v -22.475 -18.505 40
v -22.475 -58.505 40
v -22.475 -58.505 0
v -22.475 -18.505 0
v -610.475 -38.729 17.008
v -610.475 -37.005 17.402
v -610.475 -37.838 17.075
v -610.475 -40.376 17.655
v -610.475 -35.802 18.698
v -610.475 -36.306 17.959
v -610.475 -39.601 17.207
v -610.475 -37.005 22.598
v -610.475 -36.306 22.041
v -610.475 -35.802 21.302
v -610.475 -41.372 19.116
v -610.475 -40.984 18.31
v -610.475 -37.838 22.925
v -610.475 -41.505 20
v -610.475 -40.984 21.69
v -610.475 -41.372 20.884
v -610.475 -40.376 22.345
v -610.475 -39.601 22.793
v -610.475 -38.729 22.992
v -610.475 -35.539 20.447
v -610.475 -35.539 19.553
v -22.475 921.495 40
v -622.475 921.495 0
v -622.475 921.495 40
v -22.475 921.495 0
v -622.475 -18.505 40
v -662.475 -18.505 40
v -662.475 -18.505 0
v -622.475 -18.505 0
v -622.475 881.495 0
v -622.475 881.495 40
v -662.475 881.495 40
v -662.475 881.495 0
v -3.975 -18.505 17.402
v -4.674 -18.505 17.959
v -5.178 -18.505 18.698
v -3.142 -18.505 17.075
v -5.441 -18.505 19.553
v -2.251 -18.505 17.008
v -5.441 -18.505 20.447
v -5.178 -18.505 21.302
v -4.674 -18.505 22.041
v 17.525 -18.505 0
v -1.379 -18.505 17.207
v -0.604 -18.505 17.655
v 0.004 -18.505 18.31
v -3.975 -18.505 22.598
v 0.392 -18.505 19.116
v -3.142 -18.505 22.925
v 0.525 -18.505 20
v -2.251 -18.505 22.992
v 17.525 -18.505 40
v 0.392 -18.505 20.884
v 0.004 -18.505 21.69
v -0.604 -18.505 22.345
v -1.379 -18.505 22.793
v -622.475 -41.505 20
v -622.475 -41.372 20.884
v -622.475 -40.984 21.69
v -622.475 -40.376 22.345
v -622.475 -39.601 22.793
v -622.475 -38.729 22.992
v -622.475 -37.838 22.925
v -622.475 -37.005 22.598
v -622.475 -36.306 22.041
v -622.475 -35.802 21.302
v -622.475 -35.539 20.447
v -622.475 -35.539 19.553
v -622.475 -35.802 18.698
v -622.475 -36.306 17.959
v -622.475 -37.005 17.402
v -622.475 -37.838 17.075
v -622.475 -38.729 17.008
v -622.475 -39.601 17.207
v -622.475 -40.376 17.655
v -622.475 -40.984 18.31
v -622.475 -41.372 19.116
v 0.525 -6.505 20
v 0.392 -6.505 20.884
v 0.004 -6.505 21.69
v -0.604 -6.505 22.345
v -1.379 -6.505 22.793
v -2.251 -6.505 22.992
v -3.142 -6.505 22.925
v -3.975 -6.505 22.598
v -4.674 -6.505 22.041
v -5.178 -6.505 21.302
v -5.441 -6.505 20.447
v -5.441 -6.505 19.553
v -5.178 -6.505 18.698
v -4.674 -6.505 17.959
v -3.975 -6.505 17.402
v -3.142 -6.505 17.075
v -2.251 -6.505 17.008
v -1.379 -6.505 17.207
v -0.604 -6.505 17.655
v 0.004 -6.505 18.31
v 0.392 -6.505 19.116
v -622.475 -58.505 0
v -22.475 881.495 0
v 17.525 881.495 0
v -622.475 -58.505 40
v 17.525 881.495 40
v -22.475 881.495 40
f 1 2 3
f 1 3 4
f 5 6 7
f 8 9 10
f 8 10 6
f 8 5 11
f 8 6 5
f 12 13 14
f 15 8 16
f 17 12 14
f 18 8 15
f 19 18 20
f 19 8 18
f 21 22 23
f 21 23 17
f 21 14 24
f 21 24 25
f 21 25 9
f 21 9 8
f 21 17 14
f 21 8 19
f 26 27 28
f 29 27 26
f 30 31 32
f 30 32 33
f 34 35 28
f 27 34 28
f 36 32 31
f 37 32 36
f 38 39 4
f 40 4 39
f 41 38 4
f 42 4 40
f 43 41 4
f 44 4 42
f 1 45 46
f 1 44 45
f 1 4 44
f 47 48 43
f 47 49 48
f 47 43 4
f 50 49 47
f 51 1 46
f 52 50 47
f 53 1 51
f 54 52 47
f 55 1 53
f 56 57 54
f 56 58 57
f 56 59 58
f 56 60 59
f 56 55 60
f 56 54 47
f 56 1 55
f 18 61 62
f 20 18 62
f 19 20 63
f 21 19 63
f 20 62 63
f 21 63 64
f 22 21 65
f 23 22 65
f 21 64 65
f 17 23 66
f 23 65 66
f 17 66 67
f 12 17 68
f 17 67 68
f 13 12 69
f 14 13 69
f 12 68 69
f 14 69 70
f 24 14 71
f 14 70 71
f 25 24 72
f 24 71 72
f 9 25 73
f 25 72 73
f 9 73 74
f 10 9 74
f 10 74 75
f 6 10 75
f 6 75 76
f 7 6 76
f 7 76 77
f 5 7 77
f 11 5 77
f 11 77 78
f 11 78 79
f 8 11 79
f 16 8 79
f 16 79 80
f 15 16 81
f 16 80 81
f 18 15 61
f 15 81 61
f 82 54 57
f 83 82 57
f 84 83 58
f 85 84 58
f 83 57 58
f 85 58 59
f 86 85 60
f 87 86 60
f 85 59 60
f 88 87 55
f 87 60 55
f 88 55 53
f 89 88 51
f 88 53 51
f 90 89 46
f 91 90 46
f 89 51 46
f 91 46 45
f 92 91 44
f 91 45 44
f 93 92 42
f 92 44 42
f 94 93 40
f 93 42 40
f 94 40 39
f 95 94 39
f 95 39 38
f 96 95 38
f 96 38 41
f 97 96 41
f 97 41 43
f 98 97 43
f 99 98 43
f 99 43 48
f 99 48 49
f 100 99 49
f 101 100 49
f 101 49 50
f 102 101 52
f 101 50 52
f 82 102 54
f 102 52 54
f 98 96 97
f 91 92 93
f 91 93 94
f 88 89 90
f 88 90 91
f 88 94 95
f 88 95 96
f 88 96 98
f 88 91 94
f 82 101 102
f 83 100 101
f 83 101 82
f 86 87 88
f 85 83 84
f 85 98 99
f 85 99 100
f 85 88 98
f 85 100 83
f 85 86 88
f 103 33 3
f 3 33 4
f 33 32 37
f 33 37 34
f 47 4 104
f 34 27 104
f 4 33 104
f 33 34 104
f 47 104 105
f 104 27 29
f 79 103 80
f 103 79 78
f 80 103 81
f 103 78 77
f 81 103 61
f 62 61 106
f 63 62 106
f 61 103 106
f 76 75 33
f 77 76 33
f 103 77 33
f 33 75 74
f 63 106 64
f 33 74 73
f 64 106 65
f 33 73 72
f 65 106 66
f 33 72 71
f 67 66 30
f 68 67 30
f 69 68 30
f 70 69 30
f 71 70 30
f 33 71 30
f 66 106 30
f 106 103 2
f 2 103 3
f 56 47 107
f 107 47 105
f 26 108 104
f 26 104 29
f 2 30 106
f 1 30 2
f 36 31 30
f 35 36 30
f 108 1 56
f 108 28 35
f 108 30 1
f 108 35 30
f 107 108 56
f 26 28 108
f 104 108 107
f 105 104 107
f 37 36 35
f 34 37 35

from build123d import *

# Parameters (mm, degrees)
F0_W     = 680
F0_H     = 980
F1_DEPTH = 40
F2_W     = 40
F2_H     = 40
F3_DEPTH = 40
F4_R     = 3
F5_DEPTH = 12
F6_R     = 3
F7_DEPTH = 12


with BuildPart() as f1:
    # F0 (on Top) → F1 (new body)
    with BuildSketch(Plane.XY):
        with Locations((-322.474923, 431.49489)):
            Rectangle(F0_W, F0_H)
    extrude(amount=F1_DEPTH)

    # F2 (on face) → F3 (cut)
    with BuildSketch(Plane.XY.offset(40)):
        with Locations((-642.474923, 901.49489)):
            Rectangle(F2_W, F2_H)
        with Locations((-2.474923, 901.49489)):
            Rectangle(F2_W, F2_H)
        with Locations((-642.474923, -38.50511)):
            Rectangle(F2_W, F2_H)
        with Locations((-2.474923, -38.50511)):
            Rectangle(F2_W, F2_H)
    extrude(amount=-F3_DEPTH, mode=Mode.SUBTRACT)

    # F4 (on face) → F5 (cut)
    with BuildSketch(Plane.XZ.offset(18.50511)):
        with Locations((-2.474923, 20)):
            Circle(F4_R)
    extrude(amount=-F5_DEPTH, mode=Mode.SUBTRACT)

    # F6 (on face) → F7 (cut)
    with BuildSketch(Plane(origin=(-622.474923, 0, 0), x_dir=(0, -1, 0), z_dir=(-1, 0, 0))):
        with Locations((38.50511, 20)):
            Circle(F6_R)
    extrude(amount=-F7_DEPTH, mode=Mode.SUBTRACT)


solid = f1.part
